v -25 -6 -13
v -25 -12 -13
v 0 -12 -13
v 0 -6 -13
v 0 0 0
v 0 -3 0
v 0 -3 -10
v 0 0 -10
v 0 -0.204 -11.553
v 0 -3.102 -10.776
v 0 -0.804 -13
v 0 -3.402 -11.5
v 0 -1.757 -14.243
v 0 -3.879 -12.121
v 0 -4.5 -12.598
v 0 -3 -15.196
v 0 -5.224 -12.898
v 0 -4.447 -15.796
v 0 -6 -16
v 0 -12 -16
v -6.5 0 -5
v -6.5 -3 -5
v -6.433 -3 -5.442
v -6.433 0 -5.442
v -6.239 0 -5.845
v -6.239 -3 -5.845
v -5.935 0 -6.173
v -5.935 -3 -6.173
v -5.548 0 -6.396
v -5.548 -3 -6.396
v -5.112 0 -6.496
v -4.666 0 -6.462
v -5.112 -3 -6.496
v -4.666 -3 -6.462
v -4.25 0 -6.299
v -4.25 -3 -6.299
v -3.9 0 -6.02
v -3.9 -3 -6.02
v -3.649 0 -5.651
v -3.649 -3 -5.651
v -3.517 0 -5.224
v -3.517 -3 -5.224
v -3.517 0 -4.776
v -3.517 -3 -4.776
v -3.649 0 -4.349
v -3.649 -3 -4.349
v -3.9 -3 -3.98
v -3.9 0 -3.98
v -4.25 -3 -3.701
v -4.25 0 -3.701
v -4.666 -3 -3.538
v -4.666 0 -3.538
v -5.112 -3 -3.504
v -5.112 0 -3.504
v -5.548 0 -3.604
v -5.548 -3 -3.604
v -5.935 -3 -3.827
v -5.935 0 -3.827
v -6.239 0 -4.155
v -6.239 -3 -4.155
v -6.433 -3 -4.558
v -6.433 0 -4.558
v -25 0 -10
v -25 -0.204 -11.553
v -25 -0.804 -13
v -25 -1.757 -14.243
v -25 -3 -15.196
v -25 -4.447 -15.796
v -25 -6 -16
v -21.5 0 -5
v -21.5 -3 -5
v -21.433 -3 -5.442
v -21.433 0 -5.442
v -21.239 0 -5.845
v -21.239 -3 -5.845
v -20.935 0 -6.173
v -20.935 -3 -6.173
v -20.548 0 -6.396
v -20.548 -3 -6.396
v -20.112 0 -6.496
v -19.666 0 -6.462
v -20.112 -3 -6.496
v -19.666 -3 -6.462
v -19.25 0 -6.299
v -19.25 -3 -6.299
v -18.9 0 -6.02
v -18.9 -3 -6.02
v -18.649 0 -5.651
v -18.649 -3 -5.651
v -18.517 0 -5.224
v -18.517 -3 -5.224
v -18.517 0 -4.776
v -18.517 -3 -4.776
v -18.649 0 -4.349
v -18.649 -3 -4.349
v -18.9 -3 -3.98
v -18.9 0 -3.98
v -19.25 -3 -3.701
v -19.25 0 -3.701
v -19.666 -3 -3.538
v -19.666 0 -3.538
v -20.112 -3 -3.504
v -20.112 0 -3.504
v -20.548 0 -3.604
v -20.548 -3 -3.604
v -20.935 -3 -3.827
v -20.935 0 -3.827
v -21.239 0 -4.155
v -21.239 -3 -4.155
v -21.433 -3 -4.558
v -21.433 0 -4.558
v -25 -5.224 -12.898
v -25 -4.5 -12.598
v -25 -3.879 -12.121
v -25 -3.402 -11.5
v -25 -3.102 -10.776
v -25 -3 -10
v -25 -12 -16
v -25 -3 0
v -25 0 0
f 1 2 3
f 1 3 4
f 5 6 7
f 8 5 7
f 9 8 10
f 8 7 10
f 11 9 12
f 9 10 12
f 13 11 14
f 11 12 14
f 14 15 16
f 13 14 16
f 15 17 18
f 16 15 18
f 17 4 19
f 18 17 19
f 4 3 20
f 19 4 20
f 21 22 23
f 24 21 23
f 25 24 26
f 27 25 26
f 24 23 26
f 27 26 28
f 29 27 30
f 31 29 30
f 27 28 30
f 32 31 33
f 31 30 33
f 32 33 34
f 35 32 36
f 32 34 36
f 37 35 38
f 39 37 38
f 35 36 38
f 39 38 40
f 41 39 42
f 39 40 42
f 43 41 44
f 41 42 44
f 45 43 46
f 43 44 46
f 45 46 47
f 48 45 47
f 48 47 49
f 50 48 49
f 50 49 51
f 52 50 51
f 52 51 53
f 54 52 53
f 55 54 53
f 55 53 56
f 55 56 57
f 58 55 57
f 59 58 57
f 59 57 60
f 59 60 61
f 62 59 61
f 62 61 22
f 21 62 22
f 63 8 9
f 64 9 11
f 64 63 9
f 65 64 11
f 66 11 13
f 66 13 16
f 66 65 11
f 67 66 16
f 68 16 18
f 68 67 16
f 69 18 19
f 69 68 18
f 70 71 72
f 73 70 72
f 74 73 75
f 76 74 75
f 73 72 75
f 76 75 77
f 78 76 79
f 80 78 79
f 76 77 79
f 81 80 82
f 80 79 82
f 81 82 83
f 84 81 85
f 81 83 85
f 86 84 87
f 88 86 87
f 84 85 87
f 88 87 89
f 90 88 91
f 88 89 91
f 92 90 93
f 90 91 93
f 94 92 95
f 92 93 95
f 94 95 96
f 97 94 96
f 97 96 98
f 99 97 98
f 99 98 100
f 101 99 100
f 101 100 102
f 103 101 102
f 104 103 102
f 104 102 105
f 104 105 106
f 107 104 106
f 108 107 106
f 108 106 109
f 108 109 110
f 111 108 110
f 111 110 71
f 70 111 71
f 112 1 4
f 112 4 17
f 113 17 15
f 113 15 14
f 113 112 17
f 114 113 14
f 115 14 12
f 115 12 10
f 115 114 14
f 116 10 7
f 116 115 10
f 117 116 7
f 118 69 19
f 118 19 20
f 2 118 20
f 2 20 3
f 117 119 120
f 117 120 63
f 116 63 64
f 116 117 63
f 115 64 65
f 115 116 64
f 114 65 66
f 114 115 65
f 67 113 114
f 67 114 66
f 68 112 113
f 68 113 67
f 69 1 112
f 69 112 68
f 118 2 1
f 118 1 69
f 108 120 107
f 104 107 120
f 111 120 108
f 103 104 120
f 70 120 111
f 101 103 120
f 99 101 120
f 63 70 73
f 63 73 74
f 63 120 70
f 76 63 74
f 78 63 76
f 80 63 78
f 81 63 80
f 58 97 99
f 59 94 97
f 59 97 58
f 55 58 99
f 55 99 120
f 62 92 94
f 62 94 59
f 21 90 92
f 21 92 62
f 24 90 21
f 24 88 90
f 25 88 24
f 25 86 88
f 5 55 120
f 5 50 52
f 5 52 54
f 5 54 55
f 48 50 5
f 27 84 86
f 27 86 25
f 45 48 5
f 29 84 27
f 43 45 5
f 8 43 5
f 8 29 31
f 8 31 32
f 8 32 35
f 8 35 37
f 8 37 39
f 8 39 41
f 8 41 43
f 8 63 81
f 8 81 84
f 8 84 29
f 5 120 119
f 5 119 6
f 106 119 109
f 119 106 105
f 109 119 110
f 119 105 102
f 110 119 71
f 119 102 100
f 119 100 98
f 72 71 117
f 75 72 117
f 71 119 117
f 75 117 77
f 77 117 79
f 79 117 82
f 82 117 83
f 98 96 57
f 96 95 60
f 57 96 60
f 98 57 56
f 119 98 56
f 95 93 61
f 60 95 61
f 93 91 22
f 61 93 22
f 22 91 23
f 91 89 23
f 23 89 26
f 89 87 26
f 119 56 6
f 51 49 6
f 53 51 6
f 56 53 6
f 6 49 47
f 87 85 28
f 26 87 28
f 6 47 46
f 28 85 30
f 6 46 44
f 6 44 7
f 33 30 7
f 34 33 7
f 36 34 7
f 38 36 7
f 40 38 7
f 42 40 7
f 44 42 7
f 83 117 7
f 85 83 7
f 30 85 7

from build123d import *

# Parameters (mm, degrees)
SKETCH1_W                = 25
SKETCH1_H                = 10
BASE_FLANGE1_DEPTH       = 3
F_3_0_3_DIAMETER_HOLE1_D = 3
SM_EDGE_FLANGE_1_DEPTH   = 25


# Sheet-metal steps are written as plain solids
with BuildPart() as part:
    # Sketch1 → Base-Flange1 (new body)
    with BuildSketch(Plane(origin=(0, 0, 0), x_dir=(1, 0, 0), z_dir=(0, 1, 0))):
        with Locations((-12.5, 5)):
            Rectangle(SKETCH1_W, SKETCH1_H)
    extrude(amount=-BASE_FLANGE1_DEPTH)

    # Ø3.0 (3) Diameter Hole1 (through all)
    with Locations(Plane(origin=(0, 0, 0), x_dir=(1, 0, 0), z_dir=(0, 1, 0))):
        with Locations((-20, 5), (-5, 5)):
            Hole(F_3_0_3_DIAMETER_HOLE1_D / 2)

    # 邊線-凸緣1 section (across the edge) → 邊線-凸緣1 (add)
    with BuildSketch(Plane(origin=(-25, -3, -13), x_dir=(0, 0, 1), z_dir=(1, 0, 0))):
        with BuildLine():
            Line((-3, 3), (-3, 9))
            Line((-3, 9), (0, 9))
            Line((0, 9), (0, 3))
            ThreePointArc((0, 3), (0.878679656, 0.878679656), (3, 0))
            Line((3, 0), (3, -3))
            ThreePointArc((3, -3), (-1.242640687, -1.242640687), (-3, 3))
        make_face()
    extrude(amount=SM_EDGE_FLANGE_1_DEPTH)


solid = part.part
